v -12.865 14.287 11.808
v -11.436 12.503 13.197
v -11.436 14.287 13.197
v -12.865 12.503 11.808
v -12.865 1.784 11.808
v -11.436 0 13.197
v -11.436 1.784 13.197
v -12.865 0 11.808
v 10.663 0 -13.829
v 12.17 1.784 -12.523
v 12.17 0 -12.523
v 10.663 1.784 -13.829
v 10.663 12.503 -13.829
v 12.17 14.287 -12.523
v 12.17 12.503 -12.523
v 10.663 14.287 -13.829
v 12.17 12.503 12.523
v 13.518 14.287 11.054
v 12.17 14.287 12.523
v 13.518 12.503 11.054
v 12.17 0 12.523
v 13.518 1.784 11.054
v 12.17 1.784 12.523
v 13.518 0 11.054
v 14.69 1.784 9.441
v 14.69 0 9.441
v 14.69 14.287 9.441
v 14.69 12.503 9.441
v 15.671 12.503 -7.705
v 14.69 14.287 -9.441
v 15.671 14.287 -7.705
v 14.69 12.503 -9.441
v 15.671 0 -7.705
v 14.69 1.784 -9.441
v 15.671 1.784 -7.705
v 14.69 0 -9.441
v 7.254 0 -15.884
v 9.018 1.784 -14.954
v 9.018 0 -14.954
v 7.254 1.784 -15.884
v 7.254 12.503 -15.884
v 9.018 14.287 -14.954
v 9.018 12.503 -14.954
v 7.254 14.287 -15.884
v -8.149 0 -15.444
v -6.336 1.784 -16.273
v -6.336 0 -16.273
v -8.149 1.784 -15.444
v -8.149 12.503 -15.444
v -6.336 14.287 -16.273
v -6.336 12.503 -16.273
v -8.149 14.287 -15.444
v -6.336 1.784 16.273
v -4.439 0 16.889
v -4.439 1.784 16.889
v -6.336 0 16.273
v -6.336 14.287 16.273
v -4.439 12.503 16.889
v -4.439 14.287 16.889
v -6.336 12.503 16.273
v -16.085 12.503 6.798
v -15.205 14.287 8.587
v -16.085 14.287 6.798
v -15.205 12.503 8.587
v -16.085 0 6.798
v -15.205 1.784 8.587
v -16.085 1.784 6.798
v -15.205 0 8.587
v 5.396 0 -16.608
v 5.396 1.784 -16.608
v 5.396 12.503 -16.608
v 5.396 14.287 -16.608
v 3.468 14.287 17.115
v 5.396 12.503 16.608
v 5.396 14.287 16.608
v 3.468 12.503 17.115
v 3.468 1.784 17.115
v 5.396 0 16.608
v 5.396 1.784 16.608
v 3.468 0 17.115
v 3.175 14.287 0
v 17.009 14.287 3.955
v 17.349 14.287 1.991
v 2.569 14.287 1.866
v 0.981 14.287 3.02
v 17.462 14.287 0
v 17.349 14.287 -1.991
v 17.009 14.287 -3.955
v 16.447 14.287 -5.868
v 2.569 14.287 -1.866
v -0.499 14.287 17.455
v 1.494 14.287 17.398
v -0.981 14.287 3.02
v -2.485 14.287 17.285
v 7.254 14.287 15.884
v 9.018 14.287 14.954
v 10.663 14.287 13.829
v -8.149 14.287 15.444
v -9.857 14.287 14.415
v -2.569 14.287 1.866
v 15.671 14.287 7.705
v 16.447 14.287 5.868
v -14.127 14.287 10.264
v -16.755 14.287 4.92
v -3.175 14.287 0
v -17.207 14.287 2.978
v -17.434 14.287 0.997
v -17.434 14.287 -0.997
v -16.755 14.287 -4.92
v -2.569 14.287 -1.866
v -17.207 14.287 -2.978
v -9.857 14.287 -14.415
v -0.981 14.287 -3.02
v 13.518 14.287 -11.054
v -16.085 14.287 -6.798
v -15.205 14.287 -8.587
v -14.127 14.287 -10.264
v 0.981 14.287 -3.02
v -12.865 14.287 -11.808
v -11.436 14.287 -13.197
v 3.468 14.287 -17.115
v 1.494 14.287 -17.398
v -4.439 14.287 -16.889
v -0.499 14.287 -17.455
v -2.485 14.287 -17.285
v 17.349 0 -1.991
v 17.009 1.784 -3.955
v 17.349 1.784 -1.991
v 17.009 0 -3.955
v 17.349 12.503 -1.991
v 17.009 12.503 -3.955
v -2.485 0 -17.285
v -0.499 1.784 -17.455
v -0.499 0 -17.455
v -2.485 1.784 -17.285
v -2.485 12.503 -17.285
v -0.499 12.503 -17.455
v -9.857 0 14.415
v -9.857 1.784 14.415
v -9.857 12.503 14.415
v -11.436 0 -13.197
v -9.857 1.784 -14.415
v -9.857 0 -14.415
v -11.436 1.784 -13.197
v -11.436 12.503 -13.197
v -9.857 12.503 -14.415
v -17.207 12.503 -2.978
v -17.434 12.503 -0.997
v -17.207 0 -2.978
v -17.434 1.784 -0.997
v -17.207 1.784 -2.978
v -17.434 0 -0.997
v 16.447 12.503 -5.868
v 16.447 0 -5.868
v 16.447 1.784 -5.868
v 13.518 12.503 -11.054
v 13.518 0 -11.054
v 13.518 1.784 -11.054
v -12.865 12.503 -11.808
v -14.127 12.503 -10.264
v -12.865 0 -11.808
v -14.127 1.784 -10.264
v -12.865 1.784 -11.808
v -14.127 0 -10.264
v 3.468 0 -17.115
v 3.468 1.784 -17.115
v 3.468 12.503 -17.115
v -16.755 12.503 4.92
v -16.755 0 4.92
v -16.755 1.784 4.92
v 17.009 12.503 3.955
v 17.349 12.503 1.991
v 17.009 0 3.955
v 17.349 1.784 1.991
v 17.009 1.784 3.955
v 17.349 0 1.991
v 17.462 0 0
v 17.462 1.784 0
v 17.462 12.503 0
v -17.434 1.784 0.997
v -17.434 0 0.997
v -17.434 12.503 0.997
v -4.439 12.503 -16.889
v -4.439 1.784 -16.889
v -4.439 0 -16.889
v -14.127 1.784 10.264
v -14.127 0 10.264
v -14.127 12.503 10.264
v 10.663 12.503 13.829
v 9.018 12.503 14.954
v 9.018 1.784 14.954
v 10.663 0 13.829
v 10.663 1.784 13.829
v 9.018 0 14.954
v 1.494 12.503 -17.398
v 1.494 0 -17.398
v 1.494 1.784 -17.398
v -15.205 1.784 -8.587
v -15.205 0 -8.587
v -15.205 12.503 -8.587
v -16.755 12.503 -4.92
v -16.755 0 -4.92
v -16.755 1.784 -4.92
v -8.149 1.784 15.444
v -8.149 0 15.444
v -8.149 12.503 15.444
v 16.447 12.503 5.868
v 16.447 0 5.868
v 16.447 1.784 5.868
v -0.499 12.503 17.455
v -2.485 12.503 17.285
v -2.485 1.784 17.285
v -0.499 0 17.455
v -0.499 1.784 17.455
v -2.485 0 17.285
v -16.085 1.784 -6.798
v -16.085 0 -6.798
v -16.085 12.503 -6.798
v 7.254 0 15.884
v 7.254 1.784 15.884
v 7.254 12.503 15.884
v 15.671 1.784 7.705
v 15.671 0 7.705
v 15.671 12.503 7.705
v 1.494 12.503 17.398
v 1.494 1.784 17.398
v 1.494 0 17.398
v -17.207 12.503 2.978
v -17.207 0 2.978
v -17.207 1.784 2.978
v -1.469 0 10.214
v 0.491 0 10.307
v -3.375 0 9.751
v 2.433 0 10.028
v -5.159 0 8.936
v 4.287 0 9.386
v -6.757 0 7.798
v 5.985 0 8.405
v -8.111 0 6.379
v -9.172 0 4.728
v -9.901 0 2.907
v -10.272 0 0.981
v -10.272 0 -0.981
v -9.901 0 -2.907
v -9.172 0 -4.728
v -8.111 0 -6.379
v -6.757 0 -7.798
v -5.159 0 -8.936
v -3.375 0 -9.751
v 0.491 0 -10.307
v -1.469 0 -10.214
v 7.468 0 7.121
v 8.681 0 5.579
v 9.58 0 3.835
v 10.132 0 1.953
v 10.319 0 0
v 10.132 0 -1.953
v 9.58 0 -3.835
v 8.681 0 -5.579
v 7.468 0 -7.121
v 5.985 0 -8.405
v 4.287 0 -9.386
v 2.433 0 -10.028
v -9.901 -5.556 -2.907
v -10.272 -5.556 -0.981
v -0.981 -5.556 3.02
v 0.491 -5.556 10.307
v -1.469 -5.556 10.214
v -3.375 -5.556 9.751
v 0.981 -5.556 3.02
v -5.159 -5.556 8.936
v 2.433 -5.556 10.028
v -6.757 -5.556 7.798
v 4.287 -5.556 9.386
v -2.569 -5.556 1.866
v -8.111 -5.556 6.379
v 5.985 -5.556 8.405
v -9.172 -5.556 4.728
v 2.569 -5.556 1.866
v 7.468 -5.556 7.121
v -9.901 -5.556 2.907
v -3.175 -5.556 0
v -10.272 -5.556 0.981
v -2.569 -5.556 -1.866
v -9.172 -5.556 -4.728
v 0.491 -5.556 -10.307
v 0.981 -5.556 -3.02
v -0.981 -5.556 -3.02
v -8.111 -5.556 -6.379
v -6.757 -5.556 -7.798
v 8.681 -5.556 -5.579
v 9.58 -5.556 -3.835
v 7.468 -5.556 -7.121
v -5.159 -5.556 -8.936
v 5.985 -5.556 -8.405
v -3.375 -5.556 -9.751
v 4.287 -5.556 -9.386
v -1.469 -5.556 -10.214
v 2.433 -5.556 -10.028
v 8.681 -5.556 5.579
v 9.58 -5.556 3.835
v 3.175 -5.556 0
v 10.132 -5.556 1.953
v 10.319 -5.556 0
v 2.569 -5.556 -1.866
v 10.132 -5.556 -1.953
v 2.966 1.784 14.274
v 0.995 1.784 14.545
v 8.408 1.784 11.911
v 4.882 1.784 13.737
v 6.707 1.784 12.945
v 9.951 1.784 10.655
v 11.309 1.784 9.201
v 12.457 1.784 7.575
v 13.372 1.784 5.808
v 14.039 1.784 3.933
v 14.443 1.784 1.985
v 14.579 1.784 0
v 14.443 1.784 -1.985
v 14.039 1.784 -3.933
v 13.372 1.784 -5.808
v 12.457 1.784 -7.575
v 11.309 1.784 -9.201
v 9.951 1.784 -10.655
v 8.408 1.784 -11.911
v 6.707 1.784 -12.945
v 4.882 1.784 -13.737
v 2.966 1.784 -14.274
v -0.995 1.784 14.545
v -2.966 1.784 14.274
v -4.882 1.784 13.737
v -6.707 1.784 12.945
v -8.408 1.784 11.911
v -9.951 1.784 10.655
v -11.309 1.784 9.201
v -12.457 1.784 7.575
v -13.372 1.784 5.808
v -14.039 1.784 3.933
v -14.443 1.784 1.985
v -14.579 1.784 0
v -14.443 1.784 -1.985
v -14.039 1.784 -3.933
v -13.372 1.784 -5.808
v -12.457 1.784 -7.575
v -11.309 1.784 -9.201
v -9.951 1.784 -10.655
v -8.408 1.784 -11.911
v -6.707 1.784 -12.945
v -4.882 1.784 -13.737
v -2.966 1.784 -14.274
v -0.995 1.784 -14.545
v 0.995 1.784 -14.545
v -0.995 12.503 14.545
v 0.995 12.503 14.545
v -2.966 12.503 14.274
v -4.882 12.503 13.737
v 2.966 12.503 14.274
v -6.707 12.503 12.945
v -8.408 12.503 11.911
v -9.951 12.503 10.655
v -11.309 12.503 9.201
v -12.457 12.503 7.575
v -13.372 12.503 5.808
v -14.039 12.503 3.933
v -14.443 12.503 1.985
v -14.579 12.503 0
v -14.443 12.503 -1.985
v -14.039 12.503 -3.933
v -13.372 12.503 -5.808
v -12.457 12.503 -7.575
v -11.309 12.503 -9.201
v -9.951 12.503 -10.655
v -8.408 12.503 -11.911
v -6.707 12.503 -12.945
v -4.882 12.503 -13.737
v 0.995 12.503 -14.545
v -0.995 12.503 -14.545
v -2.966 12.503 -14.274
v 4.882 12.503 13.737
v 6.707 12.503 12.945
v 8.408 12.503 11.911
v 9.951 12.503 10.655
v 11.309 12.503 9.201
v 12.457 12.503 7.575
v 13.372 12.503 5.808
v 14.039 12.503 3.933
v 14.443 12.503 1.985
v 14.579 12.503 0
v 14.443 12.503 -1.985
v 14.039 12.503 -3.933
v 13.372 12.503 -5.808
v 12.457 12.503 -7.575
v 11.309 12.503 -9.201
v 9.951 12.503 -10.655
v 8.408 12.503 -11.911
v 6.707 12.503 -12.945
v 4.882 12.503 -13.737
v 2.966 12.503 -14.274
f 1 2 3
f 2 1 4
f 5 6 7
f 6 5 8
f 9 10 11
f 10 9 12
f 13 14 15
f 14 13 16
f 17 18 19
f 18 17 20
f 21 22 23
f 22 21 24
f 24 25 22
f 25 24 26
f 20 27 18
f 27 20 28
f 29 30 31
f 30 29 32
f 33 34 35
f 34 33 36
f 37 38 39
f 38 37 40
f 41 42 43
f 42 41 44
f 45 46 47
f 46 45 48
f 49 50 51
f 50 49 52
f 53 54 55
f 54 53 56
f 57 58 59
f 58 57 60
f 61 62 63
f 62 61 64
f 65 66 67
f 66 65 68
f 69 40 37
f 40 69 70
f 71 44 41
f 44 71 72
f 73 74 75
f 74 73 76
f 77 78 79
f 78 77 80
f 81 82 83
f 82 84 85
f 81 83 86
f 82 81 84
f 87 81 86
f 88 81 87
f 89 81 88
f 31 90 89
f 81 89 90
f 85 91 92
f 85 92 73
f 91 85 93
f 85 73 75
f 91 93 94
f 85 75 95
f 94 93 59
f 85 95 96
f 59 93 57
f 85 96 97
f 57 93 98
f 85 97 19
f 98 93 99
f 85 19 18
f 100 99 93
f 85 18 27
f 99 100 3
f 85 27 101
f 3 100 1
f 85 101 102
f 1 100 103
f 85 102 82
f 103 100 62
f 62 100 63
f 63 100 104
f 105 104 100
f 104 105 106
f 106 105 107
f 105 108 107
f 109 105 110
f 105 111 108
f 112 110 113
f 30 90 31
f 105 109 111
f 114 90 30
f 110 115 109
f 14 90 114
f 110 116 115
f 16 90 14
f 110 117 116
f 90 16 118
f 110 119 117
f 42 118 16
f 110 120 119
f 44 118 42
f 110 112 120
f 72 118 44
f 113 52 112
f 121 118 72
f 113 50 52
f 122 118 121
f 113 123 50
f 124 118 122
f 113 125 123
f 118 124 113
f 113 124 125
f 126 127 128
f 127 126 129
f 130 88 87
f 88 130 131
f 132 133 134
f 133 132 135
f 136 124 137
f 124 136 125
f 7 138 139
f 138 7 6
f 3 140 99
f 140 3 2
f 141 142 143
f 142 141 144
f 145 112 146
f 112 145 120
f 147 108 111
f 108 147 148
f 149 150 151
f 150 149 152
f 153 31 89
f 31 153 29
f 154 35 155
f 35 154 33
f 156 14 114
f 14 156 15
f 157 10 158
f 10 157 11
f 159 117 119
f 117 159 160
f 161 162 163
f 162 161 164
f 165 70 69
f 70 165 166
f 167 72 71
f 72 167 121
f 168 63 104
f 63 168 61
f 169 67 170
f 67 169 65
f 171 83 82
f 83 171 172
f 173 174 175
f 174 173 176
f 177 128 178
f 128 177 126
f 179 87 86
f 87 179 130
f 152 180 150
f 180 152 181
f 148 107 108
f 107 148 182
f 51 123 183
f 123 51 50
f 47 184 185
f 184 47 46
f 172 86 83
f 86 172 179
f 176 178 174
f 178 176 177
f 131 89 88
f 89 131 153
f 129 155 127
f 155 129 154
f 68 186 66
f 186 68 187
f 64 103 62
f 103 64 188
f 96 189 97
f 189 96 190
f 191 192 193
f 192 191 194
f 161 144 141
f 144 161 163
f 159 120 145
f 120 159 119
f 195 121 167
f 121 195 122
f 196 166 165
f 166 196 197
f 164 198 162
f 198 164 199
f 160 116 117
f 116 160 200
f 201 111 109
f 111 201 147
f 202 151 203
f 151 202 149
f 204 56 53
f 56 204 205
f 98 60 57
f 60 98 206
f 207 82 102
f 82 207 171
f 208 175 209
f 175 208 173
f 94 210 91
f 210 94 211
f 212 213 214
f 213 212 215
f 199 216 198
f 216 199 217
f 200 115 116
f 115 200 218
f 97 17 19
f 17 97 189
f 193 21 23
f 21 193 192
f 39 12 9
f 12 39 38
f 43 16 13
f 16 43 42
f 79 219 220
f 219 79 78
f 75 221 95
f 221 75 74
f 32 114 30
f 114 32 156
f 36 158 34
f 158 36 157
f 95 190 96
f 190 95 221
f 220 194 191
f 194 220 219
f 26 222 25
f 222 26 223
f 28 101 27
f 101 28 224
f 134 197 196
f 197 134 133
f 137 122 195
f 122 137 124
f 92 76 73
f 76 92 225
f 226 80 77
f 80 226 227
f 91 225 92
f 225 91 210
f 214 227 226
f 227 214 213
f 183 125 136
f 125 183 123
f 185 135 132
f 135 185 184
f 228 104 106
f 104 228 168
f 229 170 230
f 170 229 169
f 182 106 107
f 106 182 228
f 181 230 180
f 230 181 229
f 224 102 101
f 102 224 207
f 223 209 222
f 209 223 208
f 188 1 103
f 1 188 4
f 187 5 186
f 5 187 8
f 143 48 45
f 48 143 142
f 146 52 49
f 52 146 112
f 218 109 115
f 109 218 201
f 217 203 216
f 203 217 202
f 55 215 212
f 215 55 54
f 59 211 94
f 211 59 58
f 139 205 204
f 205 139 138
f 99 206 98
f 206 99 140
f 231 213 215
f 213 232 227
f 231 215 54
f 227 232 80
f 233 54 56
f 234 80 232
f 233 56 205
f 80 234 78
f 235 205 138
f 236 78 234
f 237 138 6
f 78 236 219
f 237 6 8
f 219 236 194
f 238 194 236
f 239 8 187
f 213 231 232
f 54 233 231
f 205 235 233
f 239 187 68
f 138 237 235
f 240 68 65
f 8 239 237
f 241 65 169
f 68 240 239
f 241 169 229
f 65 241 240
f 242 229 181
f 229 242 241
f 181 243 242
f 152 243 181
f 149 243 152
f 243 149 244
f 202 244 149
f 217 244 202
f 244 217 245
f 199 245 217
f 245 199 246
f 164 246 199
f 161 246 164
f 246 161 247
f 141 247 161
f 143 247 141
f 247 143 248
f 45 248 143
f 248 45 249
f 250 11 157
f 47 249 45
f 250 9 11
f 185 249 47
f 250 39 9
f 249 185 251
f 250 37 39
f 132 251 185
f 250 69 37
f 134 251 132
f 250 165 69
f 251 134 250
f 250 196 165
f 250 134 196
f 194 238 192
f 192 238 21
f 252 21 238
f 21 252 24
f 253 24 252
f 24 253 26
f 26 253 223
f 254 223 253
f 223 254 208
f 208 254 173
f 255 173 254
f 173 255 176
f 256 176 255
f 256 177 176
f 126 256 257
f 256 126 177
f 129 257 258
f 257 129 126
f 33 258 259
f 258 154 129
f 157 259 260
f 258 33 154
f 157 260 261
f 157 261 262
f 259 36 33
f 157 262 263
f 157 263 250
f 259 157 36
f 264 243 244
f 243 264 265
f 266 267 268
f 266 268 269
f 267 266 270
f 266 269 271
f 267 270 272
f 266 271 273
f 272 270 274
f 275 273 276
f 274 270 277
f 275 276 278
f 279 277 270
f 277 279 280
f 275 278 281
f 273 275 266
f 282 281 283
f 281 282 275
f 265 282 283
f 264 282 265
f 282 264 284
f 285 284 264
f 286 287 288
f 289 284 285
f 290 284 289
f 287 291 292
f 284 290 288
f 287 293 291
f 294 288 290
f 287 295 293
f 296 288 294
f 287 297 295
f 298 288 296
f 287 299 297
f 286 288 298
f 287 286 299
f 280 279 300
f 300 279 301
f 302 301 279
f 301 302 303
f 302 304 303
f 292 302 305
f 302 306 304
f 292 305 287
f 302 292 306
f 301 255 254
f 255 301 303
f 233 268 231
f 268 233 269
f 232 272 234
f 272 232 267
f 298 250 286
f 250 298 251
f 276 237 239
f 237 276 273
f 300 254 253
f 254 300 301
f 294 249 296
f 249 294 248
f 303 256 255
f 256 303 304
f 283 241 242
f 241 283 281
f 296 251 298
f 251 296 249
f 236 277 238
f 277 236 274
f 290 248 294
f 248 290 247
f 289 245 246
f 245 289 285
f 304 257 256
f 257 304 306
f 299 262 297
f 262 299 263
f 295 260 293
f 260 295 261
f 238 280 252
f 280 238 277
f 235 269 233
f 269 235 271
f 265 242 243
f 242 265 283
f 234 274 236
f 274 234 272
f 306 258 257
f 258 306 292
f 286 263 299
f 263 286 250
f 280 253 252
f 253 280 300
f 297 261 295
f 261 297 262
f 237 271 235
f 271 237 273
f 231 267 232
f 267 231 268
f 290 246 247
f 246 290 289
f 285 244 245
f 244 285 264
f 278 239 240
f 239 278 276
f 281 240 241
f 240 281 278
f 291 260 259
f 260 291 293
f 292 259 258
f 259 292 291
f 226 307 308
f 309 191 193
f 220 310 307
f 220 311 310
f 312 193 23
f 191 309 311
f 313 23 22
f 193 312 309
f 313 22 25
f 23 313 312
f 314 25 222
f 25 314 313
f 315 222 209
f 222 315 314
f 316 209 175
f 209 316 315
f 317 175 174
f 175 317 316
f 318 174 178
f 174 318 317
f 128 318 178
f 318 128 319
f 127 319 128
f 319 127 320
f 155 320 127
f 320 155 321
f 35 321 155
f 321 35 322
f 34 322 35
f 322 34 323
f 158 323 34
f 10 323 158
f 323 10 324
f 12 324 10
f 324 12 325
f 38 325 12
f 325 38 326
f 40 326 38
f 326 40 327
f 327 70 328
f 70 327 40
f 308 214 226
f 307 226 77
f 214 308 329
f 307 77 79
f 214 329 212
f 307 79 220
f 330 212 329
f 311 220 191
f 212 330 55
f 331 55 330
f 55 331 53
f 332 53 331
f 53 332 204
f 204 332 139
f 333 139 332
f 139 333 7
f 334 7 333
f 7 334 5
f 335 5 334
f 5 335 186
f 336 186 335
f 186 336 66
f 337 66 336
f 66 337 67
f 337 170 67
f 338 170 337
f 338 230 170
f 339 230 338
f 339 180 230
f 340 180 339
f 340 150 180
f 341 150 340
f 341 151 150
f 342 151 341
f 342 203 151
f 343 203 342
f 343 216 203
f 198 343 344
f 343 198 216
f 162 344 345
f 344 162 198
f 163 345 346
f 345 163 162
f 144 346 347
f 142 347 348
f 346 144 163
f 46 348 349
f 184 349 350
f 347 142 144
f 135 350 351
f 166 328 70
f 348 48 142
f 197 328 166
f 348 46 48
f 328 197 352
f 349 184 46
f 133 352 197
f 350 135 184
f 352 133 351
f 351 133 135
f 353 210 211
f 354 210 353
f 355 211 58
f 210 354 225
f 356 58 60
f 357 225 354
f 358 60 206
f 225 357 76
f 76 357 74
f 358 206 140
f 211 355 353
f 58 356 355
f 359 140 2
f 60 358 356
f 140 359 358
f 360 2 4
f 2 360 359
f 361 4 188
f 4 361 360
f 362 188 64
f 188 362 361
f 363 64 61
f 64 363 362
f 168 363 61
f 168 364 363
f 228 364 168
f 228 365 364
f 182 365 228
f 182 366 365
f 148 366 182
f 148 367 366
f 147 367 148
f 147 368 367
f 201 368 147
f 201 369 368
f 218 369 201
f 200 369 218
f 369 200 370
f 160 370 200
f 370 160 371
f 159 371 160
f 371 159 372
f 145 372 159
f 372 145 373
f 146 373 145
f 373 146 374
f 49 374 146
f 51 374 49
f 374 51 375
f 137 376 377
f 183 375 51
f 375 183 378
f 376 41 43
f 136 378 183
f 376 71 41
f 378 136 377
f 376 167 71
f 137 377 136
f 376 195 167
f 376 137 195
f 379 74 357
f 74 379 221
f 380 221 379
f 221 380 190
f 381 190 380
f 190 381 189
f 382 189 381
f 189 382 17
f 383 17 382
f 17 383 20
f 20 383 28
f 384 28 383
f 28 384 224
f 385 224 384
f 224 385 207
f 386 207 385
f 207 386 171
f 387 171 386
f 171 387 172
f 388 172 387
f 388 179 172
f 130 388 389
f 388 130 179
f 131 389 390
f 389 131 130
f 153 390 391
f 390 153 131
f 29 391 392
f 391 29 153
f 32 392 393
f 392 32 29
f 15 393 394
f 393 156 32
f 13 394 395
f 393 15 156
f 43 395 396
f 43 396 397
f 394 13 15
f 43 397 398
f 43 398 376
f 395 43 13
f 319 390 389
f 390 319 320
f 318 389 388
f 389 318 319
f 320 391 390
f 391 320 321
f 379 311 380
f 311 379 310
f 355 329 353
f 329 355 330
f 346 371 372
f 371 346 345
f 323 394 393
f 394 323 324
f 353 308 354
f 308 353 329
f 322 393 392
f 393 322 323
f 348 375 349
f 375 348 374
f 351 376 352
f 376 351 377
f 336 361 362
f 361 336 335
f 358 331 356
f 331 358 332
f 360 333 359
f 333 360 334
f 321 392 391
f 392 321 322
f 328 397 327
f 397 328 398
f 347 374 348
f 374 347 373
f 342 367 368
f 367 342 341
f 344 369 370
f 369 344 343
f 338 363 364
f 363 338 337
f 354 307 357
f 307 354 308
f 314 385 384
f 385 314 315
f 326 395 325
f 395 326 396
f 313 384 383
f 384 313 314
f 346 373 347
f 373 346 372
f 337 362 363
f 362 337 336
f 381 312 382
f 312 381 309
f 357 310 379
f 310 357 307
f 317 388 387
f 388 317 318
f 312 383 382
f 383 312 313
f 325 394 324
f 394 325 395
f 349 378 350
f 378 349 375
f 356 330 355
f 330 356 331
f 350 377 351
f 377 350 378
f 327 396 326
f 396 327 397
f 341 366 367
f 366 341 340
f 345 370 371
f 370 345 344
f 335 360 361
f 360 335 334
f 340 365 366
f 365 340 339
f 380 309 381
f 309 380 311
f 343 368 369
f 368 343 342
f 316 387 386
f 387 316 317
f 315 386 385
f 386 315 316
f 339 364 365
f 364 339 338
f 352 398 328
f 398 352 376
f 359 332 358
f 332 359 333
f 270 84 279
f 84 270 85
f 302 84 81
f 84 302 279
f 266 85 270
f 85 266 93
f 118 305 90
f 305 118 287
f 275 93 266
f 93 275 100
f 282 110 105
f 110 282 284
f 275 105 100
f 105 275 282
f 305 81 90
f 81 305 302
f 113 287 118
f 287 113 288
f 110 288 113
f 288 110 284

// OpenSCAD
// Metal pulleys:
// * bore: 0.25"/6.35mm
// * outer diameter 1.375"/34.925mm
// * pitch diameter 1.146"/29.1084mm
// * outer width 0.5625"/14.2875mm
// * extruded disc on side:
// ** outer diameter: 0.8125"/20.6375mm
// ** extrusion length: 0.21875"/5.55625
// * inner width: 0.422"/10.7188mm

overlap = 0.05;

// centered with collar facing in -Y direction and origin at
// point where collar and pulley meet
module metal_pulley() {
    $fa = 6;
    bore_dia = 6.35;
    outer_dia = 34.925;
    pitch_dia = 29.1084;
    outer_w = 14.2875;
    inner_w = 10.7188;
    collar_dia = 20.6375;
    collar_w = 5.55625;
    total_w = collar_w + outer_w;
    difference() {
	union() {
	    // pulley body
	    rotate([-90,0,0]) cylinder(d=outer_dia,h=outer_w);
	    // collar
	    translate([0,overlap,0]) rotate([90,0,0])
	    cylinder(d=collar_dia,h=collar_w+overlap);
	}
	// slot for belt
	difference() {
	    translate([0,(outer_w-inner_w)/2,0])
	    rotate([-90,0,0])
	    cylinder(d=outer_dia+overlap,h=inner_w);
	    translate([0,(outer_w-inner_w)/2 - overlap,0])
	    rotate([-90,0,0])
	    cylinder(d=pitch_dia+overlap,h=inner_w+overlap*2);
	    
	}
	rotate([90,0,0]) cylinder(d=bore_dia,h=2*total_w,center=true);
    }    

	
}

metal_pulley();
